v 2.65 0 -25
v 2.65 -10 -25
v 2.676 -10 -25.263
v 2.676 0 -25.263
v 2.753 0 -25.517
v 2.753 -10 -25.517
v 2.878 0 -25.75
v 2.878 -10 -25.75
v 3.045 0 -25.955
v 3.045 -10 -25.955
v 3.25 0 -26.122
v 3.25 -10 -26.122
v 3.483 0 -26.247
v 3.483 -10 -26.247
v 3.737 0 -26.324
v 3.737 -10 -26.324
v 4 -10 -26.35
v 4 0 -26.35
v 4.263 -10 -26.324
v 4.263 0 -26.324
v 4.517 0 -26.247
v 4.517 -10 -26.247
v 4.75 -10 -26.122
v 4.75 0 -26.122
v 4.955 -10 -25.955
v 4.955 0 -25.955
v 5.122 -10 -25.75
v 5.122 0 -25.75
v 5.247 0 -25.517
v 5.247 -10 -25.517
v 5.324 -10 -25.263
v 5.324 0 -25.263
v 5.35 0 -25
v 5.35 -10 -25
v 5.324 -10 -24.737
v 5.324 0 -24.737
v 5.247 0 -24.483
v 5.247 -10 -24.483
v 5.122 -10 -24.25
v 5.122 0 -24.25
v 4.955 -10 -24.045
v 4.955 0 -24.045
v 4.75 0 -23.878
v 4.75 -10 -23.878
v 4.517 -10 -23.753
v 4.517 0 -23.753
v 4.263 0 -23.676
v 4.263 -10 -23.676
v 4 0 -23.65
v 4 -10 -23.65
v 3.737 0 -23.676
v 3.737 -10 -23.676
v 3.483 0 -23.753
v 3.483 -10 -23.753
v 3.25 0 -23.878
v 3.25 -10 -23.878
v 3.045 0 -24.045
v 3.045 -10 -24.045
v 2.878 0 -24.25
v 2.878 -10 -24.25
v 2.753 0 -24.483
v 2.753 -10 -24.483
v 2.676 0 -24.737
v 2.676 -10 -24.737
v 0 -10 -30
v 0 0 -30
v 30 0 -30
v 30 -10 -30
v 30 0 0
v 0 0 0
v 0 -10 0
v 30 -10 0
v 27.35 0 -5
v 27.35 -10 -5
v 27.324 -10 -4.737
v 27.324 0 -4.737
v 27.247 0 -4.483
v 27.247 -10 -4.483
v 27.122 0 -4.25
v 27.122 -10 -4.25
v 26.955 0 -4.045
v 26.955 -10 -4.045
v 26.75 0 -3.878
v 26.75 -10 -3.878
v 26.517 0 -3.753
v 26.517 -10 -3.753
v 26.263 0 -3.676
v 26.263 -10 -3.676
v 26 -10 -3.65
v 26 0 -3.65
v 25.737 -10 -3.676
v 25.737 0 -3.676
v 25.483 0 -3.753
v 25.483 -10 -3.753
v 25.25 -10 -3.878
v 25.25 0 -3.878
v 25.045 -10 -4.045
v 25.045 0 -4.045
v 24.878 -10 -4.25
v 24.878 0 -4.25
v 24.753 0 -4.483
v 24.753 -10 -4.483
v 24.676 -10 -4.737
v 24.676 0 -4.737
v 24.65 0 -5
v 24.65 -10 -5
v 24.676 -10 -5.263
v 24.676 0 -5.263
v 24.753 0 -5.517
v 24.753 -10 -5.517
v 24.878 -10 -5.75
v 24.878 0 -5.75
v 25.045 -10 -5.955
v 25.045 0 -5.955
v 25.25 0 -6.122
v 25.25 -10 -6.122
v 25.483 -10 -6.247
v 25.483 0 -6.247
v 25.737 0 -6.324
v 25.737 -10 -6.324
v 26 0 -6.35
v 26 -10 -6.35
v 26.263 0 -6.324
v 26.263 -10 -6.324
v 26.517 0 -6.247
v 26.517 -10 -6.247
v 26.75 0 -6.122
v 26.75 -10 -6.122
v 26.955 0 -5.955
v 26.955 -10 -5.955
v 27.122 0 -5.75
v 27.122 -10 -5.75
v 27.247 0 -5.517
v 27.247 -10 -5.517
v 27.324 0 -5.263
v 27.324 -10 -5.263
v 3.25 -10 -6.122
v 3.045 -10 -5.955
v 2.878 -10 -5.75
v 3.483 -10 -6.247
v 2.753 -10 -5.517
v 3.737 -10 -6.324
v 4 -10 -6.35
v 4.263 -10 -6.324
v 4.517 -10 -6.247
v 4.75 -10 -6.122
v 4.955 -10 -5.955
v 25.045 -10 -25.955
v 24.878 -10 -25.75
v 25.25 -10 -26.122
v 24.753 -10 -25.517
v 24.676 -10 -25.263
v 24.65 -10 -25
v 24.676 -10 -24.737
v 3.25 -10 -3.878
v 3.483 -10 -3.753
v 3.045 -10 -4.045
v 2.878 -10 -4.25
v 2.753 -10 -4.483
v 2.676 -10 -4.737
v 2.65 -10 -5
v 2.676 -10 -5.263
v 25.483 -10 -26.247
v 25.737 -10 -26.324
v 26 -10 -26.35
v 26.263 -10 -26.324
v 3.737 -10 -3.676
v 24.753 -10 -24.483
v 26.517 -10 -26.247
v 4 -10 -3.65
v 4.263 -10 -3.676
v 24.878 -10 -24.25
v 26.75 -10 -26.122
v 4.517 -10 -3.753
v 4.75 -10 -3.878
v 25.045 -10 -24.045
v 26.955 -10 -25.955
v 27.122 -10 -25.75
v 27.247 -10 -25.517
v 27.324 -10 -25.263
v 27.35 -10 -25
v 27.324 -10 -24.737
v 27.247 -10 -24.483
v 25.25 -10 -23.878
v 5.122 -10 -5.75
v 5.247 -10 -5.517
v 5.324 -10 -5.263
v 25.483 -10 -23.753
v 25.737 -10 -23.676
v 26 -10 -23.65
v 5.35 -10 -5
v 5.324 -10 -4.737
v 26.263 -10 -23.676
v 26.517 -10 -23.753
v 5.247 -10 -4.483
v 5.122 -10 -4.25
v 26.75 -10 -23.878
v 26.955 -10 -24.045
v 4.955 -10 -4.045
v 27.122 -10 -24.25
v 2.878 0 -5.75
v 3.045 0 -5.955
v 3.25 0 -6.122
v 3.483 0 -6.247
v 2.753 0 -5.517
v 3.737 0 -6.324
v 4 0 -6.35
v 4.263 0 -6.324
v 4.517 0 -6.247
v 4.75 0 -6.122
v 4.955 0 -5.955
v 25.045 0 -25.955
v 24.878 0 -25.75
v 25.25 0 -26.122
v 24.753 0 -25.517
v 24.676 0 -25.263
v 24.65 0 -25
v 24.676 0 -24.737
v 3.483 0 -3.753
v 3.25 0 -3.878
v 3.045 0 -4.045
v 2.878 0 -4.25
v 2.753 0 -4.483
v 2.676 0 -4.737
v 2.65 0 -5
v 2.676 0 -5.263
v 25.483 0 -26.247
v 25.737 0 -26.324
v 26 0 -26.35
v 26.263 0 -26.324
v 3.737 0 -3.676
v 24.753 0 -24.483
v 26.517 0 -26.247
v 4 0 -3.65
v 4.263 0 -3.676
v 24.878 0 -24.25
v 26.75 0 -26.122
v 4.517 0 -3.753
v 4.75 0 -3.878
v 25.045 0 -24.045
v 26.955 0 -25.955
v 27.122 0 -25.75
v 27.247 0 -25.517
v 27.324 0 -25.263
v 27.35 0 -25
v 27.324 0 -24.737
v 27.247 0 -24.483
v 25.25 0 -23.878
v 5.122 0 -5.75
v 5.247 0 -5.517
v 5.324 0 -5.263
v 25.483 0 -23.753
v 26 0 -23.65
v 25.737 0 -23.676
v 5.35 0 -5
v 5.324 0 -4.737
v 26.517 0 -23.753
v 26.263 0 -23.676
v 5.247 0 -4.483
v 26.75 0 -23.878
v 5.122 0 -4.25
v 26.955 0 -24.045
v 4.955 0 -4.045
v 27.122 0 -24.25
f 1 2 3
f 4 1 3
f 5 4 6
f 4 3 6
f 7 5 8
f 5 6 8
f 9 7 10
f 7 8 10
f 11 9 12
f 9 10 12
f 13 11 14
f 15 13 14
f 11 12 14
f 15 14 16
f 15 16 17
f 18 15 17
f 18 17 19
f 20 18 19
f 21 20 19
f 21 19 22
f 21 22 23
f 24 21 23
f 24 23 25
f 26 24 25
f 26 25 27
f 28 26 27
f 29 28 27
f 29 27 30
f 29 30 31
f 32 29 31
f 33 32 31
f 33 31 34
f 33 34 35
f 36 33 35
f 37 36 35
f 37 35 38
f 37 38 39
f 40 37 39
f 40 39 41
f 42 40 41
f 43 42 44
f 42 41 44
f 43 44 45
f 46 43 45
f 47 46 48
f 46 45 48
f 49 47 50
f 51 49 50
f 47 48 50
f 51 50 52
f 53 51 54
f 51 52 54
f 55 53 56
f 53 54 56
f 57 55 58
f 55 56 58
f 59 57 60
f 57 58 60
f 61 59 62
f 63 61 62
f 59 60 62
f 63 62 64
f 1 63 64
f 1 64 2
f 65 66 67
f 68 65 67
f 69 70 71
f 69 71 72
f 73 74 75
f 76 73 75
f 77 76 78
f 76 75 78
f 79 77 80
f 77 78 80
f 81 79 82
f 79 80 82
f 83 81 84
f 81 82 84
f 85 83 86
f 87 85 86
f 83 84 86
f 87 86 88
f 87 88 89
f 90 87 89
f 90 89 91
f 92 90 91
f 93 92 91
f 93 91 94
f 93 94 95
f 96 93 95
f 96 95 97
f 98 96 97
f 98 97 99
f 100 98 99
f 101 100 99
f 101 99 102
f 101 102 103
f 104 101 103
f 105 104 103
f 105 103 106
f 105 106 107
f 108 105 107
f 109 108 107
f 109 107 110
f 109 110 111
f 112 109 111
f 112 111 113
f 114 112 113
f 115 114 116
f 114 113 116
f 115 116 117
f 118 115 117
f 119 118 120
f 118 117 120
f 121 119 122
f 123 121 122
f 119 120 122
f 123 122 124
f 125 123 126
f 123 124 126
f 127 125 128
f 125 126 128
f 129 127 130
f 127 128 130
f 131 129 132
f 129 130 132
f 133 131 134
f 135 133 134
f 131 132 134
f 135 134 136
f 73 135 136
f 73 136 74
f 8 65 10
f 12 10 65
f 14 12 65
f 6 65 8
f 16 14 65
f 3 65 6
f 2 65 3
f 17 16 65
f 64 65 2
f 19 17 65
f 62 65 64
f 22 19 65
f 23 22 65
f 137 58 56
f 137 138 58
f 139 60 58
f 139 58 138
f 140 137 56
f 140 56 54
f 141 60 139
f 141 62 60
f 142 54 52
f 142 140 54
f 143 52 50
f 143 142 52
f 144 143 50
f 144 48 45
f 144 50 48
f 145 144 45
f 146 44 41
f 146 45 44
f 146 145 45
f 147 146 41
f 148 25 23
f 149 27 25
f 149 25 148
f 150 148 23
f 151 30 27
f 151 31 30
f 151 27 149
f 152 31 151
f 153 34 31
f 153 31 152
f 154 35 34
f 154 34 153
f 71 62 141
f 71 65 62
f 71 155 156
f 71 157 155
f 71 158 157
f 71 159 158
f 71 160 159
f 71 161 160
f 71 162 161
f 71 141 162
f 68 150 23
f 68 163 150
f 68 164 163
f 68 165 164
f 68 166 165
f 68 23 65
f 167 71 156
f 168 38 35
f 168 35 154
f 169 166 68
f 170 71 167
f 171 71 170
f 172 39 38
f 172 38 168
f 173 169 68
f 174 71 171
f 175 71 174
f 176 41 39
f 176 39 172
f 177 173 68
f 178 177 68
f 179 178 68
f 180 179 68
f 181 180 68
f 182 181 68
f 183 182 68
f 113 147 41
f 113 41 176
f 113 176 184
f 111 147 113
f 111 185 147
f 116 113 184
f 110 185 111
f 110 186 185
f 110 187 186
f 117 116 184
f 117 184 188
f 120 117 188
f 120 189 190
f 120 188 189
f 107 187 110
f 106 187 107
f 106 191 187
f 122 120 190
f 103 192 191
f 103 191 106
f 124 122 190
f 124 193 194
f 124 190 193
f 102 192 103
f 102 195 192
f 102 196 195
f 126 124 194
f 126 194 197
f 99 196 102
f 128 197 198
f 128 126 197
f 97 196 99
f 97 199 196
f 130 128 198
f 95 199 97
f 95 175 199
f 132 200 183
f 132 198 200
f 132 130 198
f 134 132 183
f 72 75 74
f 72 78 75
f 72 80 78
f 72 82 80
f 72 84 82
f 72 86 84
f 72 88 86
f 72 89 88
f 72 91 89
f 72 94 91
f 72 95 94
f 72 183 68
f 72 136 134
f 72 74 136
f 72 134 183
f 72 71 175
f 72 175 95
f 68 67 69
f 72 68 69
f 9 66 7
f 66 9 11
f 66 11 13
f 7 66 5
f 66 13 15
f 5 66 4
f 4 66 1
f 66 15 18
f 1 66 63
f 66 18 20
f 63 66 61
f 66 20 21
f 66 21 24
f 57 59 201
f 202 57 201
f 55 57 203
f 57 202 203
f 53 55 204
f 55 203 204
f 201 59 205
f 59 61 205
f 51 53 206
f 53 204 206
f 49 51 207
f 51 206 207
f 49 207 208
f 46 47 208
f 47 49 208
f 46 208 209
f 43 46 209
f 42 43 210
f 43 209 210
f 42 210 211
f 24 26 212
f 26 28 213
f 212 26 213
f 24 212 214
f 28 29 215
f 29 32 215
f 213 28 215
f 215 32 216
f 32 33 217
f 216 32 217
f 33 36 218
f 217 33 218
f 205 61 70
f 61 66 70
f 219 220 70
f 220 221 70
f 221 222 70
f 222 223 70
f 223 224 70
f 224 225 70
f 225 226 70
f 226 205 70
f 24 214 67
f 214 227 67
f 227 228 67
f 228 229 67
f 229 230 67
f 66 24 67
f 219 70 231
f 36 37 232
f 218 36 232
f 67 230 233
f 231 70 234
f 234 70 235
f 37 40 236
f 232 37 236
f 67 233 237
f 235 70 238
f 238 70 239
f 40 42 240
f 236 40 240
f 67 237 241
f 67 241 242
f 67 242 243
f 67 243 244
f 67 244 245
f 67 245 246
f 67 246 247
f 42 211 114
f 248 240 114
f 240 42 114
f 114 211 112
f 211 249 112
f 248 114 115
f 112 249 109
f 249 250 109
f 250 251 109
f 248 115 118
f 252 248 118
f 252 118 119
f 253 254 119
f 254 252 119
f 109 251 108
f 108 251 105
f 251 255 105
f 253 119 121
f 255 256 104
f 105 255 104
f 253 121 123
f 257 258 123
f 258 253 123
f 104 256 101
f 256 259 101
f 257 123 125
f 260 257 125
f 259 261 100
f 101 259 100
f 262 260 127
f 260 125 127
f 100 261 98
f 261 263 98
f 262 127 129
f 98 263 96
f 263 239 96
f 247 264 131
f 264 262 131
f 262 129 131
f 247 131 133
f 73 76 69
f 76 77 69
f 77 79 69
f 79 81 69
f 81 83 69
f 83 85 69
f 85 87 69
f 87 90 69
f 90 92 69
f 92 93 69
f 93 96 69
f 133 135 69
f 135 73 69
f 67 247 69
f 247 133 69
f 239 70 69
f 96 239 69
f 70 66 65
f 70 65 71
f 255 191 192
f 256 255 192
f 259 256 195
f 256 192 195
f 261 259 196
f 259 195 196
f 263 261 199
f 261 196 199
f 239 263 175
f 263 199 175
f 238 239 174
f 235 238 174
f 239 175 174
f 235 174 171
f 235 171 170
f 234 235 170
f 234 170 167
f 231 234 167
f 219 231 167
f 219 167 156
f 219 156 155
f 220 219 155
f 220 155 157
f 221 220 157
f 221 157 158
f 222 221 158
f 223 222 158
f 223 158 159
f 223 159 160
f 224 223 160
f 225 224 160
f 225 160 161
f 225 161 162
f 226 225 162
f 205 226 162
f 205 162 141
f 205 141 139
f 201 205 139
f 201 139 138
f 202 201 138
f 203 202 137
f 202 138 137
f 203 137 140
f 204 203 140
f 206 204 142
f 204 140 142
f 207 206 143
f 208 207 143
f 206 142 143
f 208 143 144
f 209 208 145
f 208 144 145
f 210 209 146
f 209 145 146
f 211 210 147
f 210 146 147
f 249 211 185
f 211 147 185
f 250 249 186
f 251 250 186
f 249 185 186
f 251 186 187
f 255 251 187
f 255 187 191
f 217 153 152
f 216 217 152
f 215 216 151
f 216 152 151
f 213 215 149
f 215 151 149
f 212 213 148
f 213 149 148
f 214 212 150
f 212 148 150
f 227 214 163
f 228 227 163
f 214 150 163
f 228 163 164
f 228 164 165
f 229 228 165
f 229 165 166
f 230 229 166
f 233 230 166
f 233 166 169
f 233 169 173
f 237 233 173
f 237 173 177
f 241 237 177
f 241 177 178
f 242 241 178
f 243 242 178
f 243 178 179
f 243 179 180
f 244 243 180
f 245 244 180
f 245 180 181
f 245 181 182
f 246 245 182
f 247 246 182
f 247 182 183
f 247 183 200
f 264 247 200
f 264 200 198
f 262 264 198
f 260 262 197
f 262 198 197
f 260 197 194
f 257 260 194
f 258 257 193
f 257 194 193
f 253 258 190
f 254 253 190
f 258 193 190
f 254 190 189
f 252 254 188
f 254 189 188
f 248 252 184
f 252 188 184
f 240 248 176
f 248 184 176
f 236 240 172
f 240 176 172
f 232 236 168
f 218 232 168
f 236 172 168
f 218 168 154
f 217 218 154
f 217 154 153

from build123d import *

# Parameters (mm, degrees)
F0_W     = 30
F0_H     = 30
F1_DEPTH = 10
F3_DEPTH = 25


with BuildPart() as f1:
    # F0 (on Front) → F1 (new body)
    with BuildSketch(Plane.XZ):
        with Locations((15, -15)):
            Rectangle(F0_W, F0_H)
    extrude(amount=F1_DEPTH)

    # F2 (on face) → F3 (cut)
    with BuildSketch(Plane.XZ.offset(10)):
        with BuildLine():
            ThreePointArc((5.35, -25), (4, -23.65), (2.65, -25))
            Line((2.65, -25), (5.35, -25))
        make_face()
        with BuildLine():
            Line((5.35, -25), (2.65, -25))
            ThreePointArc((2.65, -25), (4, -26.35), (5.35, -25))
        make_face()
        with BuildLine():
            ThreePointArc((27.35, -25), (26, -23.65), (24.65, -25))
            Line((24.65, -25), (27.35, -25))
        make_face()
        with BuildLine():
            Line((27.35, -25), (24.65, -25))
            ThreePointArc((24.65, -25), (26, -26.35), (27.35, -25))
        make_face()
        with BuildLine():
            Line((27.35, -5), (24.65, -5))
            ThreePointArc((24.65, -5), (26, -6.35), (27.35, -5))
        make_face()
        with BuildLine():
            ThreePointArc((27.35, -5), (26, -3.65), (24.65, -5))
            Line((24.65, -5), (27.35, -5))
        make_face()
        with BuildLine():
            Line((5.35, -5), (2.65, -5))
            ThreePointArc((2.65, -5), (4, -6.35), (5.35, -5))
        make_face()
        with BuildLine():
            ThreePointArc((5.35, -5), (4, -3.65), (2.65, -5))
            Line((2.65, -5), (5.35, -5))
        make_face()
    extrude(amount=-F3_DEPTH, mode=Mode.SUBTRACT)


solid = f1.part
